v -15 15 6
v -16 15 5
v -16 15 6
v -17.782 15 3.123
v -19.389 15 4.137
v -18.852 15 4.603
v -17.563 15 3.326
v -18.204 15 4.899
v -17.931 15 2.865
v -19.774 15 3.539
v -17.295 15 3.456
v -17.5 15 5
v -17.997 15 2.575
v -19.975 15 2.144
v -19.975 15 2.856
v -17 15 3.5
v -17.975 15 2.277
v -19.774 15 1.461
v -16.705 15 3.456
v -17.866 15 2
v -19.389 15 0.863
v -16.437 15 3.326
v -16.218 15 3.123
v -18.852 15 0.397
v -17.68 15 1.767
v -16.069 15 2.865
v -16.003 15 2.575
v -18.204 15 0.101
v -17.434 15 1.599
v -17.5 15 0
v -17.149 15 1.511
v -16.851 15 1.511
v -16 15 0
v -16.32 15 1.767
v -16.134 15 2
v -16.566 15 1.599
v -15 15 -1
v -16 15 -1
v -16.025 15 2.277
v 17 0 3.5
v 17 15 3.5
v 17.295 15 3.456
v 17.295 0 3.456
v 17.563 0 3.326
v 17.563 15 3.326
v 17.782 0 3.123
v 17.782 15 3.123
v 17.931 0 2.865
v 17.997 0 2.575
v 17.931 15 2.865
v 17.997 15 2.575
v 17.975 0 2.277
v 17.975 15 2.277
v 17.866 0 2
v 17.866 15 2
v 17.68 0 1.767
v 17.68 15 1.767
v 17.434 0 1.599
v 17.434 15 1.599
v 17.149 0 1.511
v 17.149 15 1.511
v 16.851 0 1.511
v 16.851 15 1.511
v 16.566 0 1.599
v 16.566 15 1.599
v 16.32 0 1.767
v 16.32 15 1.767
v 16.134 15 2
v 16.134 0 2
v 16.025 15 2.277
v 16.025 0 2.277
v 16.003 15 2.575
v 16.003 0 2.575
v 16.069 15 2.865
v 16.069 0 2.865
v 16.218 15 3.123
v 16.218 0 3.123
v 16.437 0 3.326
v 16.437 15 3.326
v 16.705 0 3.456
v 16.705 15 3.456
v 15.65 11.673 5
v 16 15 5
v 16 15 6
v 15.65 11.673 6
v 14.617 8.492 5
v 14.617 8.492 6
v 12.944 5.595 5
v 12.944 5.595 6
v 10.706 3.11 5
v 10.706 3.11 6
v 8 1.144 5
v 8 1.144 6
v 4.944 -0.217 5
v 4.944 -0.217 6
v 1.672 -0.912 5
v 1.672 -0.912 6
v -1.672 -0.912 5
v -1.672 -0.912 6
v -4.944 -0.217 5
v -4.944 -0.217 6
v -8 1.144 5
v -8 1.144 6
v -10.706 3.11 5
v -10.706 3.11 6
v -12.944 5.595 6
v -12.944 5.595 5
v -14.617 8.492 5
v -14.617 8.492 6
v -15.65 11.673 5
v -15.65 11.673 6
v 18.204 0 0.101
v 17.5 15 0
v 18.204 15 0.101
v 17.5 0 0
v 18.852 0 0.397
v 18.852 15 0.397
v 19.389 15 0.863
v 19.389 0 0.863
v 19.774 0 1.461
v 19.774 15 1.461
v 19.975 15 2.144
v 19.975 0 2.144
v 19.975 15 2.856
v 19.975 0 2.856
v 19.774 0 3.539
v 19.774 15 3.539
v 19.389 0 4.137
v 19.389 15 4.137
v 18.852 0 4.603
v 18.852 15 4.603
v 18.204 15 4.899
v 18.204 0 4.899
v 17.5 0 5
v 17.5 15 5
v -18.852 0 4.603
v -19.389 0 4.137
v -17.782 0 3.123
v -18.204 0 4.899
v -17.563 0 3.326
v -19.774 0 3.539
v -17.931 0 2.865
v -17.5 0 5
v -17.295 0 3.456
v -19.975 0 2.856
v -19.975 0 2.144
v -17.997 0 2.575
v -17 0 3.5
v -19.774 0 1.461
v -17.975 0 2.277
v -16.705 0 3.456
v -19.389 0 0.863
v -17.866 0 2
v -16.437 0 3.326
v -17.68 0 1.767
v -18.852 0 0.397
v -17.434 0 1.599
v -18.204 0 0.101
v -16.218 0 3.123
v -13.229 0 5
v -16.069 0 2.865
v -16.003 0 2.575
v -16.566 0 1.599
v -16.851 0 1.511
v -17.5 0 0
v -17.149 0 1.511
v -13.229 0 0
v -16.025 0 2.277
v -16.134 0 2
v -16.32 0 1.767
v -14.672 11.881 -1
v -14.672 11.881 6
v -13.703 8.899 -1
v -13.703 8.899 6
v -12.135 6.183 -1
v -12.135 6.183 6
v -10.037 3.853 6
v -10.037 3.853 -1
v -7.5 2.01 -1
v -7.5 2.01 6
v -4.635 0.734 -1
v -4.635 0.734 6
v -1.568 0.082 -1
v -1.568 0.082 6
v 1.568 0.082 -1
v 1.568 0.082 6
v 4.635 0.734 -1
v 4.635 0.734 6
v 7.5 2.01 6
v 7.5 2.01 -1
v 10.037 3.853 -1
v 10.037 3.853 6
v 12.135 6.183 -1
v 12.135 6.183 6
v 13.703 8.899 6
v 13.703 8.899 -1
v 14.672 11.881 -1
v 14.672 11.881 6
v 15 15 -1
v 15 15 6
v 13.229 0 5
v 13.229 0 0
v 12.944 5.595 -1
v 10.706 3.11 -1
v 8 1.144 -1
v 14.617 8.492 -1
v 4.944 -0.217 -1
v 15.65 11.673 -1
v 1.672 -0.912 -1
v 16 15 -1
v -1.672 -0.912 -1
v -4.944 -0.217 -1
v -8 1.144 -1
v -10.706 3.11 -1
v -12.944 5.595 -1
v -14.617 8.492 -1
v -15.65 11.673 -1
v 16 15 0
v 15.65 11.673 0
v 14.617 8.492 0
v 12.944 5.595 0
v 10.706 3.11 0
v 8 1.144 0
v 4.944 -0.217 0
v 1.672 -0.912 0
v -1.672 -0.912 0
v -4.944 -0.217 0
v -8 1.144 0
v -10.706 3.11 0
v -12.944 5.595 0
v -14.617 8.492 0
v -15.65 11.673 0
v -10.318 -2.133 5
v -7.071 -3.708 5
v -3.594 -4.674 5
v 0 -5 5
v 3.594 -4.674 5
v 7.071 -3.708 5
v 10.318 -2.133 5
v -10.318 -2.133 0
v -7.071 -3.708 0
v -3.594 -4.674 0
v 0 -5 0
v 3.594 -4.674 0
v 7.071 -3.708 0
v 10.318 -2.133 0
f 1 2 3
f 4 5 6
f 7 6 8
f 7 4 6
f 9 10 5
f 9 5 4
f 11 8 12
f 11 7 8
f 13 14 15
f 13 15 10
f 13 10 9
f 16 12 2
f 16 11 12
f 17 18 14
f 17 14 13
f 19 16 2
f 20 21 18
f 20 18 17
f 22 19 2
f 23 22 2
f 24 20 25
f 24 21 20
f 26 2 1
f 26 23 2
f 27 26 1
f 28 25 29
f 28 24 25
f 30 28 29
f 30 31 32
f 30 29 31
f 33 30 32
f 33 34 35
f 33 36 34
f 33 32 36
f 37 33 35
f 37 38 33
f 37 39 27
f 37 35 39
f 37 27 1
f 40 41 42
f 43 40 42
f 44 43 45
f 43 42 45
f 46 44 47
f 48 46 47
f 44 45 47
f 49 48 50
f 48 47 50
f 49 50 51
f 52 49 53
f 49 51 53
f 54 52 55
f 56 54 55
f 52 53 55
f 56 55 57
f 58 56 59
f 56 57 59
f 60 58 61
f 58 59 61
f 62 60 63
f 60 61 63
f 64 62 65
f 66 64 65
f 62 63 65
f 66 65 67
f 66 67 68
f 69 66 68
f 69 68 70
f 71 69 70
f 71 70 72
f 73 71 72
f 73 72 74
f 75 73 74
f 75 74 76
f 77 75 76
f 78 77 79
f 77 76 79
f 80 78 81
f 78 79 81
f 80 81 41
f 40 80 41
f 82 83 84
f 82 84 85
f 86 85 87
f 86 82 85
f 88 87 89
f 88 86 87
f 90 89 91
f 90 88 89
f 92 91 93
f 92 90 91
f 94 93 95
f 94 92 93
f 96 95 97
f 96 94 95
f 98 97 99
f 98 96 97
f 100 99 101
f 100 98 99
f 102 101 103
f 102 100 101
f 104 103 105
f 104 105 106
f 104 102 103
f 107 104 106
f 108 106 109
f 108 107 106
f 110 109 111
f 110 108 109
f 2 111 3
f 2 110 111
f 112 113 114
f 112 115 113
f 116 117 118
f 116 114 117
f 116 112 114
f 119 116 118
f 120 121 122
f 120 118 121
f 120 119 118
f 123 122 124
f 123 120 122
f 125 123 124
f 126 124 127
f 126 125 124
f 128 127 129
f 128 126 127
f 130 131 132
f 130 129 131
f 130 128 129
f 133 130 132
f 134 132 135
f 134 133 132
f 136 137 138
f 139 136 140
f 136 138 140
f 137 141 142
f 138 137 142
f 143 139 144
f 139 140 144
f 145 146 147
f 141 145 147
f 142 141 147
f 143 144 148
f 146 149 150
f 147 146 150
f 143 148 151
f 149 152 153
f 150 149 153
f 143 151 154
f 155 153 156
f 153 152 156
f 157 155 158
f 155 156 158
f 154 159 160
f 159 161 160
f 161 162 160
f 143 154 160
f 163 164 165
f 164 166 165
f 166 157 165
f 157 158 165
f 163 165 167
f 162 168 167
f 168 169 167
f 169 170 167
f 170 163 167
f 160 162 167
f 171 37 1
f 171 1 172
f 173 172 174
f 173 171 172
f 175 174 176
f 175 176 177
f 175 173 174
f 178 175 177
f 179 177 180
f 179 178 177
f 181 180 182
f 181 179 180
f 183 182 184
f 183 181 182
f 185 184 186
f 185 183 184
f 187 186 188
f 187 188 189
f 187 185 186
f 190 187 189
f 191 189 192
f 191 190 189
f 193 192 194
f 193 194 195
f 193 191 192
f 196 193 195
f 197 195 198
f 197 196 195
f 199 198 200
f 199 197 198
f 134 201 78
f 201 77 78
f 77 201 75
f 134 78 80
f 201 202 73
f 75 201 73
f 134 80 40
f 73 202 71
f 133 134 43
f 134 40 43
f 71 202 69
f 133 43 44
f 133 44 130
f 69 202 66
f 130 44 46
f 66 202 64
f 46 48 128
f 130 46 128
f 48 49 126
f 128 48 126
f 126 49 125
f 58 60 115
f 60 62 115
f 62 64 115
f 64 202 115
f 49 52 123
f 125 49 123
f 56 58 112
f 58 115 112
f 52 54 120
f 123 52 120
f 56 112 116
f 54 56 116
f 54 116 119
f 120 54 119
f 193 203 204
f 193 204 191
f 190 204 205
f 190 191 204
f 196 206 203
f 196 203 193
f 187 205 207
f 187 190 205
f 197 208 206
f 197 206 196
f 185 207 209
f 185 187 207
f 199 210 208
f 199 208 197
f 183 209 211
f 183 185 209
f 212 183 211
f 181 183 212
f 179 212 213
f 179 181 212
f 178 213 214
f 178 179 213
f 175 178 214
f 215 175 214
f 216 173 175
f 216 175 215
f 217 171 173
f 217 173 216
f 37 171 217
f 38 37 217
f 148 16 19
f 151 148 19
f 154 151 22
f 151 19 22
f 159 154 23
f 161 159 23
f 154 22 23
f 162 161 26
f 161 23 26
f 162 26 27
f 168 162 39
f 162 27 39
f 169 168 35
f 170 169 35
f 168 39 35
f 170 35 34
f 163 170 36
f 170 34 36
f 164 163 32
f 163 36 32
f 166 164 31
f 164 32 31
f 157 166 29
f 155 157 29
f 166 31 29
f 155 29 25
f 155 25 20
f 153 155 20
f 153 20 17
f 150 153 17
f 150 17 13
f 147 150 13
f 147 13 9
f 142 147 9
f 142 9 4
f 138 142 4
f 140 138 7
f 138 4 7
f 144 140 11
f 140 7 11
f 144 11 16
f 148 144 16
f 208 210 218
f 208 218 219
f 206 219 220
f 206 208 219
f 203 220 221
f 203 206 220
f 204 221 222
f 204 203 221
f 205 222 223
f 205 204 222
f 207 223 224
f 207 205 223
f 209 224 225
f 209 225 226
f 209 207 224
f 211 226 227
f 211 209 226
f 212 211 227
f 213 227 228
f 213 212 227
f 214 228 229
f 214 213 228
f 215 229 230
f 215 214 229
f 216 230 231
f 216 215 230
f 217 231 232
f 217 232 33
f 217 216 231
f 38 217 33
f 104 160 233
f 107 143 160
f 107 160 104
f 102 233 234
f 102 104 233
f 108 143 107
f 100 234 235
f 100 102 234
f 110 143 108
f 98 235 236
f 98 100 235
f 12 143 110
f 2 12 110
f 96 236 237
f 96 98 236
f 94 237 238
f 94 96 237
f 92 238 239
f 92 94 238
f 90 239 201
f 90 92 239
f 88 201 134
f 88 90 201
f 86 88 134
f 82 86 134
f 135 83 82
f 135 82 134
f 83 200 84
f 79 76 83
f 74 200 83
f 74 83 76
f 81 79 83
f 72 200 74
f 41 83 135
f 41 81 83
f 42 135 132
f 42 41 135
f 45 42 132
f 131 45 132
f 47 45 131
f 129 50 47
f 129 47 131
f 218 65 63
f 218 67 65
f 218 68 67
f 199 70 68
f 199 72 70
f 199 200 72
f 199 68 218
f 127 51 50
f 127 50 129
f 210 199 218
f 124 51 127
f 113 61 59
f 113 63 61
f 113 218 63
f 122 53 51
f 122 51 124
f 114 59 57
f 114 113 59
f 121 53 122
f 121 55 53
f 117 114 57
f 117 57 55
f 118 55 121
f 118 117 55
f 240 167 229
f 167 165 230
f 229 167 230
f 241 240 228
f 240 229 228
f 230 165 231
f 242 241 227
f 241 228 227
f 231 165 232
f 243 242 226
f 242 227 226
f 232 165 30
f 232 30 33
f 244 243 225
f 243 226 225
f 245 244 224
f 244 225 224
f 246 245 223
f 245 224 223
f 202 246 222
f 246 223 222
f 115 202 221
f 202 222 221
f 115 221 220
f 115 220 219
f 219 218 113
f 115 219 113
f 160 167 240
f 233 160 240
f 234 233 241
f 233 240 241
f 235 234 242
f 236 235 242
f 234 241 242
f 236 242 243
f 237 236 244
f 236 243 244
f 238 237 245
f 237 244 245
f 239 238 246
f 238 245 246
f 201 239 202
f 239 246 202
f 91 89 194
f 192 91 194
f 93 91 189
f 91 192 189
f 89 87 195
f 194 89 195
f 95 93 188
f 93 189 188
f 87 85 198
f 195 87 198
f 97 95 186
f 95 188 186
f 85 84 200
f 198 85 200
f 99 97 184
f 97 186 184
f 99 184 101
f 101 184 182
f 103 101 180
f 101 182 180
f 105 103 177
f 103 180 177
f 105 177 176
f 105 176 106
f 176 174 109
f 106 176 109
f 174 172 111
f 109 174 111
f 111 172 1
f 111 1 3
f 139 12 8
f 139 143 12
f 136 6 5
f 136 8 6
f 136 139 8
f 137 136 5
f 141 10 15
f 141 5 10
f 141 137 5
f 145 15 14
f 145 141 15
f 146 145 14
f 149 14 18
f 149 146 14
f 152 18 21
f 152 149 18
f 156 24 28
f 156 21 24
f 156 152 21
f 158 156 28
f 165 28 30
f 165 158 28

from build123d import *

# Parameters (mm, degrees)
BOSS_EXTRUDE1_DEPTH = 5
BOSS_EXTRUDE2_DEPTH = 1
FILLET1_RADIUS      = 2.5
FILLET1_LENGTH      = 15
FILLET2_RADIUS      = 2.5
FILLET2_LENGTH      = 15
BOSS_EXTRUDE3_START = -6
BOSS_EXTRUDE3_DEPTH = 6
SKETCH5_R           = 1
CUT_EXTRUDE2_DEPTH  = 15


with BuildPart() as part:
    # Sketch2 → Boss-Extrude1 (new body)
    with BuildSketch(Plane.XY):
        with BuildLine():
            Line((-20, 15), (-20, 0))
            Line((-20, 0), (-13.228756555, 0))
            ThreePointArc((-13.228756555, 0), (0, -5), (13.228756555, 0))
            Line((13.228756555, 0), (20, 0))
            Line((20, 0), (20, 15))
            Line((20, 15), (15, 15))
            ThreePointArc((15, 15), (0, 0), (-15, 15))
            Line((-15, 15), (-20, 15))
        make_face()
    extrude(amount=BOSS_EXTRUDE1_DEPTH)

    # Sketch3 → Boss-Extrude2 (add)
    with BuildSketch(Plane.XY.offset(5)):
        with BuildLine():
            Line((-16, 15), (-15, 15))
            ThreePointArc((-15, 15), (0, 0), (15, 15))
            Line((15, 15), (16, 15))
            ThreePointArc((16, 15), (0, -1), (-16, 15))
        make_face()
    extrude(amount=BOSS_EXTRUDE2_DEPTH)

    # Fillet1: full round fillet: the end face becomes a half cylinder, R = half its width
    fillet1_face = Plane((20, 7.5, 2.5), x_dir=(0, -1, 0), z_dir=(1, 0, 0))  # on the end face: x along it, z out of the body
    fillet1_slab = fillet1_face.offset(-FILLET1_RADIUS / 2) * Box(FILLET1_LENGTH, 2 * FILLET1_RADIUS, FILLET1_RADIUS, mode=Mode.PRIVATE)  # the body's end, R deep
    fillet1_round = Plane((17.5, 7.5, 2.5), x_dir=(1, 0, 0), z_dir=(0, -1, 0)) * Cylinder(FILLET1_RADIUS, FILLET1_LENGTH, mode=Mode.PRIVATE)  # its axis R under the face
    add(fillet1_slab - fillet1_round, mode=Mode.SUBTRACT)

    # Fillet2: full round fillet: the end face becomes a half cylinder, R = half its width
    fillet2_face = Plane((-20, 7.5, 2.5), x_dir=(0, -1, 0), z_dir=(-1, 0, 0))  # on the end face: x along it, z out of the body
    fillet2_slab = fillet2_face.offset(-FILLET2_RADIUS / 2) * Box(FILLET2_LENGTH, 2 * FILLET2_RADIUS, FILLET2_RADIUS, mode=Mode.PRIVATE)  # the body's end, R deep
    fillet2_round = Plane((-17.5, 7.5, 2.5), x_dir=(-1, 0, 0), z_dir=(0, -1, 0)) * Cylinder(FILLET2_RADIUS, FILLET2_LENGTH, mode=Mode.PRIVATE)  # its axis R under the face
    add(fillet2_slab - fillet2_round, mode=Mode.SUBTRACT)

    # Sketch3<2> → Boss-Extrude3 (add)
    with BuildSketch(Plane.XY.offset(5).offset(BOSS_EXTRUDE3_START)):
        with BuildLine():
            Line((-16, 15), (-15, 15))
            ThreePointArc((-15, 15), (0, 0), (15, 15))
            Line((15, 15), (16, 15))
            ThreePointArc((16, 15), (0, -1), (-16, 15))
        make_face()
    extrude(amount=BOSS_EXTRUDE3_DEPTH)

    # Sketch5 → Cut-Extrude2 (cut)
    with BuildSketch(Plane(origin=(0, 15, 0), x_dir=(1, 0, 0), z_dir=(0, 1, 0))):
        with Locations(Location((-17, -2.5, 0), (0, 0, 270))):
            Circle(SKETCH5_R)
        with Locations(Location((17, -2.5, 0), (0, 0, 270))):
            Circle(SKETCH5_R)
    extrude(amount=-CUT_EXTRUDE2_DEPTH, mode=Mode.SUBTRACT)


solid = part.part
